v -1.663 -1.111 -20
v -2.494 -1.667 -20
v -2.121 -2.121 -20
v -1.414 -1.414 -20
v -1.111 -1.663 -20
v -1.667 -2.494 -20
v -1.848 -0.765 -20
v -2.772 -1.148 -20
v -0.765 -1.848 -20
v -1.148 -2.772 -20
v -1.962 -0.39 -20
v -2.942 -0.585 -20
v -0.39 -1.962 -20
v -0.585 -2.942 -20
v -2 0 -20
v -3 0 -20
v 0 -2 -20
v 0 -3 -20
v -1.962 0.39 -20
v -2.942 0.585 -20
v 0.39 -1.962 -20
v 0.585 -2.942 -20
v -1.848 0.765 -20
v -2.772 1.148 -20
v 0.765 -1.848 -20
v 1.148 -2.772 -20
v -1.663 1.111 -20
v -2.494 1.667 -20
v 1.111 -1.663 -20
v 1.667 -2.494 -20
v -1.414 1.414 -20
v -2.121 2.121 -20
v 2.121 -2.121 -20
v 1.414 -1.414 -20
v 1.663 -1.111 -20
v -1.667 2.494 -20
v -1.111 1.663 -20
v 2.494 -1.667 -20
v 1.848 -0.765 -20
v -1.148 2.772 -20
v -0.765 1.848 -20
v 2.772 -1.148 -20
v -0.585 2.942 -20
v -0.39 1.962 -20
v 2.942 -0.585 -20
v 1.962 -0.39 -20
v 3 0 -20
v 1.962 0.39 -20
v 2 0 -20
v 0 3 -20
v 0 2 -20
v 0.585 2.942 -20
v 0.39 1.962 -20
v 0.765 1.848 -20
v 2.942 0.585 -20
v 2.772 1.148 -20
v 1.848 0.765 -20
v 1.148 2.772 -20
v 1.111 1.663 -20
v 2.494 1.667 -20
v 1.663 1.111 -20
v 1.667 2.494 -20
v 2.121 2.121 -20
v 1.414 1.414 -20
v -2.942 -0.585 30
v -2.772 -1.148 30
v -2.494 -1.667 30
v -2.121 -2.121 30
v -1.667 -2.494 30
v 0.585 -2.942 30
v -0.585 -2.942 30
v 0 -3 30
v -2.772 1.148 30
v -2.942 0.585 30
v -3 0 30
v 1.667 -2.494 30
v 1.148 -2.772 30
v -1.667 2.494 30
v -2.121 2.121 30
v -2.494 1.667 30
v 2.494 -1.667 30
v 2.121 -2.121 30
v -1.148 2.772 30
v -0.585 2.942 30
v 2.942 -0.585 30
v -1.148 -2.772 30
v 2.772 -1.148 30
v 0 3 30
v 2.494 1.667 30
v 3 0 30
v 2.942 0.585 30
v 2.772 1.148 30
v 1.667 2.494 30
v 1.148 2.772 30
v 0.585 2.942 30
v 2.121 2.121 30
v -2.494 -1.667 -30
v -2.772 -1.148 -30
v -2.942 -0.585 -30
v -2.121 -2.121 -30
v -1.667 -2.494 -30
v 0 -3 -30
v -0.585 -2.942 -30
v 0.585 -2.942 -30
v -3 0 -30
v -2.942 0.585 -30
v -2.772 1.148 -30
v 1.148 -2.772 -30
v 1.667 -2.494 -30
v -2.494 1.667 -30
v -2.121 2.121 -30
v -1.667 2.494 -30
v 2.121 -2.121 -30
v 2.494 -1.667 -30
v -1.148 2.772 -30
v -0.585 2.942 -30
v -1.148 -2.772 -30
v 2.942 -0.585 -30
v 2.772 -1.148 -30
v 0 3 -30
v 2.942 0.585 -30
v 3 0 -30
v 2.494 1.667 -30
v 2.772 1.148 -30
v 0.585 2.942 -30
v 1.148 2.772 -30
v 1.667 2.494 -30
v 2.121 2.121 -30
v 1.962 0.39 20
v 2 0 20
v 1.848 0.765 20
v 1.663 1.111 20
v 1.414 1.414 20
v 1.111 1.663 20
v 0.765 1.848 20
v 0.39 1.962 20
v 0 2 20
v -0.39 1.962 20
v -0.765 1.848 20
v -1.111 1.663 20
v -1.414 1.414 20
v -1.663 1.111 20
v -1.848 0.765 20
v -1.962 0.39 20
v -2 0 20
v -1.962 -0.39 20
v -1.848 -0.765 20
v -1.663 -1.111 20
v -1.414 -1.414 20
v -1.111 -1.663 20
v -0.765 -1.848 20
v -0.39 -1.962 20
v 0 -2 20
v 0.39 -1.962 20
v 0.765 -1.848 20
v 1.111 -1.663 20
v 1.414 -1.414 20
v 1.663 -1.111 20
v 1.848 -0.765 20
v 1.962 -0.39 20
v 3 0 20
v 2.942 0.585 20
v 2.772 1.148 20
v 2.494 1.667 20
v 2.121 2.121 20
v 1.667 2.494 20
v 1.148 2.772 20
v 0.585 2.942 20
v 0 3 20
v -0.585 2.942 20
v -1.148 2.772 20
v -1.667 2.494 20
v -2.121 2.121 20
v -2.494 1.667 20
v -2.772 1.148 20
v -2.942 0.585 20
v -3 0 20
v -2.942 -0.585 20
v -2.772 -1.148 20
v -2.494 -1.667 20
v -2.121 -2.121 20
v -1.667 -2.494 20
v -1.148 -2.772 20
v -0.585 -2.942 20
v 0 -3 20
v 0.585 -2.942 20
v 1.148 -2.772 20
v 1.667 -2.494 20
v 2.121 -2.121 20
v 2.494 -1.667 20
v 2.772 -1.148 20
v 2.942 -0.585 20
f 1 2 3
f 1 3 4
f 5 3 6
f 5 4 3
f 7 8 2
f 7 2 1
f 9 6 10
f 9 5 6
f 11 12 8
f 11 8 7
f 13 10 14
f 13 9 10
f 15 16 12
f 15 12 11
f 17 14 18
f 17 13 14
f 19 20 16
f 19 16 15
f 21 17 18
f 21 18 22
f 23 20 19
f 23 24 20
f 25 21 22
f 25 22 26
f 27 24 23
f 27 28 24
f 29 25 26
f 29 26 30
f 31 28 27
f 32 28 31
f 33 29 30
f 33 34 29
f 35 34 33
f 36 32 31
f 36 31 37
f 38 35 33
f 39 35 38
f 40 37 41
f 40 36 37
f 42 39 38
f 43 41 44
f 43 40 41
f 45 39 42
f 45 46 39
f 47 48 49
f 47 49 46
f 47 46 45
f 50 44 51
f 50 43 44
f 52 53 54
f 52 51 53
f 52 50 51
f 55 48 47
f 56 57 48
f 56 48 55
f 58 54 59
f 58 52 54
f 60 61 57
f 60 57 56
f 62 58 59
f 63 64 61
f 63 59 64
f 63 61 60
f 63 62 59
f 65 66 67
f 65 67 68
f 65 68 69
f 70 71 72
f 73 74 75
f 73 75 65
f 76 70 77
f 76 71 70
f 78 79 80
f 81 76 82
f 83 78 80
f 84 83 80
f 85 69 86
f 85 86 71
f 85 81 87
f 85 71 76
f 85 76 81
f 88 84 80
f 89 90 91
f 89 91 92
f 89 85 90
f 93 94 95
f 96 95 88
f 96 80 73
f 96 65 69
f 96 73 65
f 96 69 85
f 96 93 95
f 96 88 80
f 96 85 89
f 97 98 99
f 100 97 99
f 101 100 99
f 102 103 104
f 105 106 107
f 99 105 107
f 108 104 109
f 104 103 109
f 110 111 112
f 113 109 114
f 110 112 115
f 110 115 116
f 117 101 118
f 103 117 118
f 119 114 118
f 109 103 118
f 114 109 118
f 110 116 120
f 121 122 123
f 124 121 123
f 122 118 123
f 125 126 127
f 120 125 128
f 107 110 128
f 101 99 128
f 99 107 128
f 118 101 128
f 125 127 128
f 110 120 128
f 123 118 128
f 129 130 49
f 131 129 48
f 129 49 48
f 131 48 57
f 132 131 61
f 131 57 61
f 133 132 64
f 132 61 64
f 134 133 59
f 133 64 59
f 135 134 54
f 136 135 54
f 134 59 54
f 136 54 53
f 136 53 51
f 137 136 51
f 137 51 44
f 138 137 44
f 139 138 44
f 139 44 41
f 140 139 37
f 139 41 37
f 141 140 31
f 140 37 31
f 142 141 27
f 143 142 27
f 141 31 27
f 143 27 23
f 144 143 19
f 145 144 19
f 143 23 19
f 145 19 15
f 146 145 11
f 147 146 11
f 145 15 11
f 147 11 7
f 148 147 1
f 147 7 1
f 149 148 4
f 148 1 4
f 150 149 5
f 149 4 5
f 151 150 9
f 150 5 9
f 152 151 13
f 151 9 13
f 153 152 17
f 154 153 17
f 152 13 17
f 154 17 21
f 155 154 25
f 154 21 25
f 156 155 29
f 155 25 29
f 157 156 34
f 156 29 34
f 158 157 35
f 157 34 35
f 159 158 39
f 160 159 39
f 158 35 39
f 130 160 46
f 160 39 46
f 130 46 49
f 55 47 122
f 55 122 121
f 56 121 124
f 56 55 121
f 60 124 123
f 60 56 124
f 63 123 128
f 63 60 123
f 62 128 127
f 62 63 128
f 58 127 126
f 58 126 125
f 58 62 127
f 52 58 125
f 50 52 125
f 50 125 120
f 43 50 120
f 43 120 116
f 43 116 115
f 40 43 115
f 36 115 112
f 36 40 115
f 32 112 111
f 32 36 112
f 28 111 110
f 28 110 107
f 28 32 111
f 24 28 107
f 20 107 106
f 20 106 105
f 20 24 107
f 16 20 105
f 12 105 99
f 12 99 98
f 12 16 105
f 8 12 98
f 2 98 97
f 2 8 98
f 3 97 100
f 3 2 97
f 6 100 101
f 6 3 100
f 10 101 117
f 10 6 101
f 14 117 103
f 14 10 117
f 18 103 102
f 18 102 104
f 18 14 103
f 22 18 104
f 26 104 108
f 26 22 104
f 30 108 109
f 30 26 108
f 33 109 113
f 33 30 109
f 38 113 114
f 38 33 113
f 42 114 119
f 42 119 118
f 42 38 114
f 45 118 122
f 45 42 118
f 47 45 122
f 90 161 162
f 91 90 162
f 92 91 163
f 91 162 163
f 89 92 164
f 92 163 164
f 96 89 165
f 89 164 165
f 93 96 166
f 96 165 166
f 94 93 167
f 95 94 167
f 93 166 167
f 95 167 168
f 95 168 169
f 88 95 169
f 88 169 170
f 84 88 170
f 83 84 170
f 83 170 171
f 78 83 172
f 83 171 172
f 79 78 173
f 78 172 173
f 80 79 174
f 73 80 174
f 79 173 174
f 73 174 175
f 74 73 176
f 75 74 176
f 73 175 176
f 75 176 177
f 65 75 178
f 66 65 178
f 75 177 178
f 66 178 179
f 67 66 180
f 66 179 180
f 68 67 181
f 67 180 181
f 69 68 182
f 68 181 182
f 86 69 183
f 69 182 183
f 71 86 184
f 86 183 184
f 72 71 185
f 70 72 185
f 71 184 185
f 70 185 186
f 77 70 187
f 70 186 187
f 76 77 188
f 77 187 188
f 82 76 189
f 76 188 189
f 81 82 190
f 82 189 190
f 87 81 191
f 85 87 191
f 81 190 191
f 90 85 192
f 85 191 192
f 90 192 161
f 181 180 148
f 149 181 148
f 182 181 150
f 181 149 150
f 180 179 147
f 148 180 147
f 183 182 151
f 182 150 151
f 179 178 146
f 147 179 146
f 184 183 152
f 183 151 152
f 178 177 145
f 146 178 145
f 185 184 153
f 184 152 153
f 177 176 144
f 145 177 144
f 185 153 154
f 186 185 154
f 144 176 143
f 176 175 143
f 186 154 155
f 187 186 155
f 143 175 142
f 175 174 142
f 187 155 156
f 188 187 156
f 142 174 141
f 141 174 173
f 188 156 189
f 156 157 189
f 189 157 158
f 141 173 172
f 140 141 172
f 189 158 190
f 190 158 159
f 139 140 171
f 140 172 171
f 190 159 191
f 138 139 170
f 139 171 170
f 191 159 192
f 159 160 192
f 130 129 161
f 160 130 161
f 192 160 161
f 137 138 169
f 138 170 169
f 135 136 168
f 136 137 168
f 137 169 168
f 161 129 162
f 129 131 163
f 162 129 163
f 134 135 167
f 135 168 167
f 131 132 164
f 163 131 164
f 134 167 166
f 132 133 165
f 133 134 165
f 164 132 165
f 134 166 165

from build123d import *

# Parameters (mm, degrees)
BOSS_EXTRUDE1_DEPTH      = 20
BOSS_EXTRUDE1_DEPTH_BACK = 20
SKETCH1_R                = 2
SKETCH2_R                = 3
BOSS_EXTRUDE2_DEPTH      = 10


with BuildPart() as part:
    # Sketch1 → Boss-Extrude1 (new, two sides: drawn at the far end of the back side and taken through both)
    with BuildSketch(Plane.XY.offset(-BOSS_EXTRUDE1_DEPTH_BACK)):
        Circle(SKETCH1_R)
    extrude(amount=BOSS_EXTRUDE1_DEPTH + BOSS_EXTRUDE1_DEPTH_BACK)

    # Sketch2 → Boss-Extrude2 (add)
    with BuildSketch(Plane.XY.offset(20)):
        Circle(SKETCH2_R)
    boss_extrude2 = extrude(amount=BOSS_EXTRUDE2_DEPTH)

    # Mirror1: Boss-Extrude2 across plane
    add(boss_extrude2.mirror(Plane.XY))


solid = part.part
